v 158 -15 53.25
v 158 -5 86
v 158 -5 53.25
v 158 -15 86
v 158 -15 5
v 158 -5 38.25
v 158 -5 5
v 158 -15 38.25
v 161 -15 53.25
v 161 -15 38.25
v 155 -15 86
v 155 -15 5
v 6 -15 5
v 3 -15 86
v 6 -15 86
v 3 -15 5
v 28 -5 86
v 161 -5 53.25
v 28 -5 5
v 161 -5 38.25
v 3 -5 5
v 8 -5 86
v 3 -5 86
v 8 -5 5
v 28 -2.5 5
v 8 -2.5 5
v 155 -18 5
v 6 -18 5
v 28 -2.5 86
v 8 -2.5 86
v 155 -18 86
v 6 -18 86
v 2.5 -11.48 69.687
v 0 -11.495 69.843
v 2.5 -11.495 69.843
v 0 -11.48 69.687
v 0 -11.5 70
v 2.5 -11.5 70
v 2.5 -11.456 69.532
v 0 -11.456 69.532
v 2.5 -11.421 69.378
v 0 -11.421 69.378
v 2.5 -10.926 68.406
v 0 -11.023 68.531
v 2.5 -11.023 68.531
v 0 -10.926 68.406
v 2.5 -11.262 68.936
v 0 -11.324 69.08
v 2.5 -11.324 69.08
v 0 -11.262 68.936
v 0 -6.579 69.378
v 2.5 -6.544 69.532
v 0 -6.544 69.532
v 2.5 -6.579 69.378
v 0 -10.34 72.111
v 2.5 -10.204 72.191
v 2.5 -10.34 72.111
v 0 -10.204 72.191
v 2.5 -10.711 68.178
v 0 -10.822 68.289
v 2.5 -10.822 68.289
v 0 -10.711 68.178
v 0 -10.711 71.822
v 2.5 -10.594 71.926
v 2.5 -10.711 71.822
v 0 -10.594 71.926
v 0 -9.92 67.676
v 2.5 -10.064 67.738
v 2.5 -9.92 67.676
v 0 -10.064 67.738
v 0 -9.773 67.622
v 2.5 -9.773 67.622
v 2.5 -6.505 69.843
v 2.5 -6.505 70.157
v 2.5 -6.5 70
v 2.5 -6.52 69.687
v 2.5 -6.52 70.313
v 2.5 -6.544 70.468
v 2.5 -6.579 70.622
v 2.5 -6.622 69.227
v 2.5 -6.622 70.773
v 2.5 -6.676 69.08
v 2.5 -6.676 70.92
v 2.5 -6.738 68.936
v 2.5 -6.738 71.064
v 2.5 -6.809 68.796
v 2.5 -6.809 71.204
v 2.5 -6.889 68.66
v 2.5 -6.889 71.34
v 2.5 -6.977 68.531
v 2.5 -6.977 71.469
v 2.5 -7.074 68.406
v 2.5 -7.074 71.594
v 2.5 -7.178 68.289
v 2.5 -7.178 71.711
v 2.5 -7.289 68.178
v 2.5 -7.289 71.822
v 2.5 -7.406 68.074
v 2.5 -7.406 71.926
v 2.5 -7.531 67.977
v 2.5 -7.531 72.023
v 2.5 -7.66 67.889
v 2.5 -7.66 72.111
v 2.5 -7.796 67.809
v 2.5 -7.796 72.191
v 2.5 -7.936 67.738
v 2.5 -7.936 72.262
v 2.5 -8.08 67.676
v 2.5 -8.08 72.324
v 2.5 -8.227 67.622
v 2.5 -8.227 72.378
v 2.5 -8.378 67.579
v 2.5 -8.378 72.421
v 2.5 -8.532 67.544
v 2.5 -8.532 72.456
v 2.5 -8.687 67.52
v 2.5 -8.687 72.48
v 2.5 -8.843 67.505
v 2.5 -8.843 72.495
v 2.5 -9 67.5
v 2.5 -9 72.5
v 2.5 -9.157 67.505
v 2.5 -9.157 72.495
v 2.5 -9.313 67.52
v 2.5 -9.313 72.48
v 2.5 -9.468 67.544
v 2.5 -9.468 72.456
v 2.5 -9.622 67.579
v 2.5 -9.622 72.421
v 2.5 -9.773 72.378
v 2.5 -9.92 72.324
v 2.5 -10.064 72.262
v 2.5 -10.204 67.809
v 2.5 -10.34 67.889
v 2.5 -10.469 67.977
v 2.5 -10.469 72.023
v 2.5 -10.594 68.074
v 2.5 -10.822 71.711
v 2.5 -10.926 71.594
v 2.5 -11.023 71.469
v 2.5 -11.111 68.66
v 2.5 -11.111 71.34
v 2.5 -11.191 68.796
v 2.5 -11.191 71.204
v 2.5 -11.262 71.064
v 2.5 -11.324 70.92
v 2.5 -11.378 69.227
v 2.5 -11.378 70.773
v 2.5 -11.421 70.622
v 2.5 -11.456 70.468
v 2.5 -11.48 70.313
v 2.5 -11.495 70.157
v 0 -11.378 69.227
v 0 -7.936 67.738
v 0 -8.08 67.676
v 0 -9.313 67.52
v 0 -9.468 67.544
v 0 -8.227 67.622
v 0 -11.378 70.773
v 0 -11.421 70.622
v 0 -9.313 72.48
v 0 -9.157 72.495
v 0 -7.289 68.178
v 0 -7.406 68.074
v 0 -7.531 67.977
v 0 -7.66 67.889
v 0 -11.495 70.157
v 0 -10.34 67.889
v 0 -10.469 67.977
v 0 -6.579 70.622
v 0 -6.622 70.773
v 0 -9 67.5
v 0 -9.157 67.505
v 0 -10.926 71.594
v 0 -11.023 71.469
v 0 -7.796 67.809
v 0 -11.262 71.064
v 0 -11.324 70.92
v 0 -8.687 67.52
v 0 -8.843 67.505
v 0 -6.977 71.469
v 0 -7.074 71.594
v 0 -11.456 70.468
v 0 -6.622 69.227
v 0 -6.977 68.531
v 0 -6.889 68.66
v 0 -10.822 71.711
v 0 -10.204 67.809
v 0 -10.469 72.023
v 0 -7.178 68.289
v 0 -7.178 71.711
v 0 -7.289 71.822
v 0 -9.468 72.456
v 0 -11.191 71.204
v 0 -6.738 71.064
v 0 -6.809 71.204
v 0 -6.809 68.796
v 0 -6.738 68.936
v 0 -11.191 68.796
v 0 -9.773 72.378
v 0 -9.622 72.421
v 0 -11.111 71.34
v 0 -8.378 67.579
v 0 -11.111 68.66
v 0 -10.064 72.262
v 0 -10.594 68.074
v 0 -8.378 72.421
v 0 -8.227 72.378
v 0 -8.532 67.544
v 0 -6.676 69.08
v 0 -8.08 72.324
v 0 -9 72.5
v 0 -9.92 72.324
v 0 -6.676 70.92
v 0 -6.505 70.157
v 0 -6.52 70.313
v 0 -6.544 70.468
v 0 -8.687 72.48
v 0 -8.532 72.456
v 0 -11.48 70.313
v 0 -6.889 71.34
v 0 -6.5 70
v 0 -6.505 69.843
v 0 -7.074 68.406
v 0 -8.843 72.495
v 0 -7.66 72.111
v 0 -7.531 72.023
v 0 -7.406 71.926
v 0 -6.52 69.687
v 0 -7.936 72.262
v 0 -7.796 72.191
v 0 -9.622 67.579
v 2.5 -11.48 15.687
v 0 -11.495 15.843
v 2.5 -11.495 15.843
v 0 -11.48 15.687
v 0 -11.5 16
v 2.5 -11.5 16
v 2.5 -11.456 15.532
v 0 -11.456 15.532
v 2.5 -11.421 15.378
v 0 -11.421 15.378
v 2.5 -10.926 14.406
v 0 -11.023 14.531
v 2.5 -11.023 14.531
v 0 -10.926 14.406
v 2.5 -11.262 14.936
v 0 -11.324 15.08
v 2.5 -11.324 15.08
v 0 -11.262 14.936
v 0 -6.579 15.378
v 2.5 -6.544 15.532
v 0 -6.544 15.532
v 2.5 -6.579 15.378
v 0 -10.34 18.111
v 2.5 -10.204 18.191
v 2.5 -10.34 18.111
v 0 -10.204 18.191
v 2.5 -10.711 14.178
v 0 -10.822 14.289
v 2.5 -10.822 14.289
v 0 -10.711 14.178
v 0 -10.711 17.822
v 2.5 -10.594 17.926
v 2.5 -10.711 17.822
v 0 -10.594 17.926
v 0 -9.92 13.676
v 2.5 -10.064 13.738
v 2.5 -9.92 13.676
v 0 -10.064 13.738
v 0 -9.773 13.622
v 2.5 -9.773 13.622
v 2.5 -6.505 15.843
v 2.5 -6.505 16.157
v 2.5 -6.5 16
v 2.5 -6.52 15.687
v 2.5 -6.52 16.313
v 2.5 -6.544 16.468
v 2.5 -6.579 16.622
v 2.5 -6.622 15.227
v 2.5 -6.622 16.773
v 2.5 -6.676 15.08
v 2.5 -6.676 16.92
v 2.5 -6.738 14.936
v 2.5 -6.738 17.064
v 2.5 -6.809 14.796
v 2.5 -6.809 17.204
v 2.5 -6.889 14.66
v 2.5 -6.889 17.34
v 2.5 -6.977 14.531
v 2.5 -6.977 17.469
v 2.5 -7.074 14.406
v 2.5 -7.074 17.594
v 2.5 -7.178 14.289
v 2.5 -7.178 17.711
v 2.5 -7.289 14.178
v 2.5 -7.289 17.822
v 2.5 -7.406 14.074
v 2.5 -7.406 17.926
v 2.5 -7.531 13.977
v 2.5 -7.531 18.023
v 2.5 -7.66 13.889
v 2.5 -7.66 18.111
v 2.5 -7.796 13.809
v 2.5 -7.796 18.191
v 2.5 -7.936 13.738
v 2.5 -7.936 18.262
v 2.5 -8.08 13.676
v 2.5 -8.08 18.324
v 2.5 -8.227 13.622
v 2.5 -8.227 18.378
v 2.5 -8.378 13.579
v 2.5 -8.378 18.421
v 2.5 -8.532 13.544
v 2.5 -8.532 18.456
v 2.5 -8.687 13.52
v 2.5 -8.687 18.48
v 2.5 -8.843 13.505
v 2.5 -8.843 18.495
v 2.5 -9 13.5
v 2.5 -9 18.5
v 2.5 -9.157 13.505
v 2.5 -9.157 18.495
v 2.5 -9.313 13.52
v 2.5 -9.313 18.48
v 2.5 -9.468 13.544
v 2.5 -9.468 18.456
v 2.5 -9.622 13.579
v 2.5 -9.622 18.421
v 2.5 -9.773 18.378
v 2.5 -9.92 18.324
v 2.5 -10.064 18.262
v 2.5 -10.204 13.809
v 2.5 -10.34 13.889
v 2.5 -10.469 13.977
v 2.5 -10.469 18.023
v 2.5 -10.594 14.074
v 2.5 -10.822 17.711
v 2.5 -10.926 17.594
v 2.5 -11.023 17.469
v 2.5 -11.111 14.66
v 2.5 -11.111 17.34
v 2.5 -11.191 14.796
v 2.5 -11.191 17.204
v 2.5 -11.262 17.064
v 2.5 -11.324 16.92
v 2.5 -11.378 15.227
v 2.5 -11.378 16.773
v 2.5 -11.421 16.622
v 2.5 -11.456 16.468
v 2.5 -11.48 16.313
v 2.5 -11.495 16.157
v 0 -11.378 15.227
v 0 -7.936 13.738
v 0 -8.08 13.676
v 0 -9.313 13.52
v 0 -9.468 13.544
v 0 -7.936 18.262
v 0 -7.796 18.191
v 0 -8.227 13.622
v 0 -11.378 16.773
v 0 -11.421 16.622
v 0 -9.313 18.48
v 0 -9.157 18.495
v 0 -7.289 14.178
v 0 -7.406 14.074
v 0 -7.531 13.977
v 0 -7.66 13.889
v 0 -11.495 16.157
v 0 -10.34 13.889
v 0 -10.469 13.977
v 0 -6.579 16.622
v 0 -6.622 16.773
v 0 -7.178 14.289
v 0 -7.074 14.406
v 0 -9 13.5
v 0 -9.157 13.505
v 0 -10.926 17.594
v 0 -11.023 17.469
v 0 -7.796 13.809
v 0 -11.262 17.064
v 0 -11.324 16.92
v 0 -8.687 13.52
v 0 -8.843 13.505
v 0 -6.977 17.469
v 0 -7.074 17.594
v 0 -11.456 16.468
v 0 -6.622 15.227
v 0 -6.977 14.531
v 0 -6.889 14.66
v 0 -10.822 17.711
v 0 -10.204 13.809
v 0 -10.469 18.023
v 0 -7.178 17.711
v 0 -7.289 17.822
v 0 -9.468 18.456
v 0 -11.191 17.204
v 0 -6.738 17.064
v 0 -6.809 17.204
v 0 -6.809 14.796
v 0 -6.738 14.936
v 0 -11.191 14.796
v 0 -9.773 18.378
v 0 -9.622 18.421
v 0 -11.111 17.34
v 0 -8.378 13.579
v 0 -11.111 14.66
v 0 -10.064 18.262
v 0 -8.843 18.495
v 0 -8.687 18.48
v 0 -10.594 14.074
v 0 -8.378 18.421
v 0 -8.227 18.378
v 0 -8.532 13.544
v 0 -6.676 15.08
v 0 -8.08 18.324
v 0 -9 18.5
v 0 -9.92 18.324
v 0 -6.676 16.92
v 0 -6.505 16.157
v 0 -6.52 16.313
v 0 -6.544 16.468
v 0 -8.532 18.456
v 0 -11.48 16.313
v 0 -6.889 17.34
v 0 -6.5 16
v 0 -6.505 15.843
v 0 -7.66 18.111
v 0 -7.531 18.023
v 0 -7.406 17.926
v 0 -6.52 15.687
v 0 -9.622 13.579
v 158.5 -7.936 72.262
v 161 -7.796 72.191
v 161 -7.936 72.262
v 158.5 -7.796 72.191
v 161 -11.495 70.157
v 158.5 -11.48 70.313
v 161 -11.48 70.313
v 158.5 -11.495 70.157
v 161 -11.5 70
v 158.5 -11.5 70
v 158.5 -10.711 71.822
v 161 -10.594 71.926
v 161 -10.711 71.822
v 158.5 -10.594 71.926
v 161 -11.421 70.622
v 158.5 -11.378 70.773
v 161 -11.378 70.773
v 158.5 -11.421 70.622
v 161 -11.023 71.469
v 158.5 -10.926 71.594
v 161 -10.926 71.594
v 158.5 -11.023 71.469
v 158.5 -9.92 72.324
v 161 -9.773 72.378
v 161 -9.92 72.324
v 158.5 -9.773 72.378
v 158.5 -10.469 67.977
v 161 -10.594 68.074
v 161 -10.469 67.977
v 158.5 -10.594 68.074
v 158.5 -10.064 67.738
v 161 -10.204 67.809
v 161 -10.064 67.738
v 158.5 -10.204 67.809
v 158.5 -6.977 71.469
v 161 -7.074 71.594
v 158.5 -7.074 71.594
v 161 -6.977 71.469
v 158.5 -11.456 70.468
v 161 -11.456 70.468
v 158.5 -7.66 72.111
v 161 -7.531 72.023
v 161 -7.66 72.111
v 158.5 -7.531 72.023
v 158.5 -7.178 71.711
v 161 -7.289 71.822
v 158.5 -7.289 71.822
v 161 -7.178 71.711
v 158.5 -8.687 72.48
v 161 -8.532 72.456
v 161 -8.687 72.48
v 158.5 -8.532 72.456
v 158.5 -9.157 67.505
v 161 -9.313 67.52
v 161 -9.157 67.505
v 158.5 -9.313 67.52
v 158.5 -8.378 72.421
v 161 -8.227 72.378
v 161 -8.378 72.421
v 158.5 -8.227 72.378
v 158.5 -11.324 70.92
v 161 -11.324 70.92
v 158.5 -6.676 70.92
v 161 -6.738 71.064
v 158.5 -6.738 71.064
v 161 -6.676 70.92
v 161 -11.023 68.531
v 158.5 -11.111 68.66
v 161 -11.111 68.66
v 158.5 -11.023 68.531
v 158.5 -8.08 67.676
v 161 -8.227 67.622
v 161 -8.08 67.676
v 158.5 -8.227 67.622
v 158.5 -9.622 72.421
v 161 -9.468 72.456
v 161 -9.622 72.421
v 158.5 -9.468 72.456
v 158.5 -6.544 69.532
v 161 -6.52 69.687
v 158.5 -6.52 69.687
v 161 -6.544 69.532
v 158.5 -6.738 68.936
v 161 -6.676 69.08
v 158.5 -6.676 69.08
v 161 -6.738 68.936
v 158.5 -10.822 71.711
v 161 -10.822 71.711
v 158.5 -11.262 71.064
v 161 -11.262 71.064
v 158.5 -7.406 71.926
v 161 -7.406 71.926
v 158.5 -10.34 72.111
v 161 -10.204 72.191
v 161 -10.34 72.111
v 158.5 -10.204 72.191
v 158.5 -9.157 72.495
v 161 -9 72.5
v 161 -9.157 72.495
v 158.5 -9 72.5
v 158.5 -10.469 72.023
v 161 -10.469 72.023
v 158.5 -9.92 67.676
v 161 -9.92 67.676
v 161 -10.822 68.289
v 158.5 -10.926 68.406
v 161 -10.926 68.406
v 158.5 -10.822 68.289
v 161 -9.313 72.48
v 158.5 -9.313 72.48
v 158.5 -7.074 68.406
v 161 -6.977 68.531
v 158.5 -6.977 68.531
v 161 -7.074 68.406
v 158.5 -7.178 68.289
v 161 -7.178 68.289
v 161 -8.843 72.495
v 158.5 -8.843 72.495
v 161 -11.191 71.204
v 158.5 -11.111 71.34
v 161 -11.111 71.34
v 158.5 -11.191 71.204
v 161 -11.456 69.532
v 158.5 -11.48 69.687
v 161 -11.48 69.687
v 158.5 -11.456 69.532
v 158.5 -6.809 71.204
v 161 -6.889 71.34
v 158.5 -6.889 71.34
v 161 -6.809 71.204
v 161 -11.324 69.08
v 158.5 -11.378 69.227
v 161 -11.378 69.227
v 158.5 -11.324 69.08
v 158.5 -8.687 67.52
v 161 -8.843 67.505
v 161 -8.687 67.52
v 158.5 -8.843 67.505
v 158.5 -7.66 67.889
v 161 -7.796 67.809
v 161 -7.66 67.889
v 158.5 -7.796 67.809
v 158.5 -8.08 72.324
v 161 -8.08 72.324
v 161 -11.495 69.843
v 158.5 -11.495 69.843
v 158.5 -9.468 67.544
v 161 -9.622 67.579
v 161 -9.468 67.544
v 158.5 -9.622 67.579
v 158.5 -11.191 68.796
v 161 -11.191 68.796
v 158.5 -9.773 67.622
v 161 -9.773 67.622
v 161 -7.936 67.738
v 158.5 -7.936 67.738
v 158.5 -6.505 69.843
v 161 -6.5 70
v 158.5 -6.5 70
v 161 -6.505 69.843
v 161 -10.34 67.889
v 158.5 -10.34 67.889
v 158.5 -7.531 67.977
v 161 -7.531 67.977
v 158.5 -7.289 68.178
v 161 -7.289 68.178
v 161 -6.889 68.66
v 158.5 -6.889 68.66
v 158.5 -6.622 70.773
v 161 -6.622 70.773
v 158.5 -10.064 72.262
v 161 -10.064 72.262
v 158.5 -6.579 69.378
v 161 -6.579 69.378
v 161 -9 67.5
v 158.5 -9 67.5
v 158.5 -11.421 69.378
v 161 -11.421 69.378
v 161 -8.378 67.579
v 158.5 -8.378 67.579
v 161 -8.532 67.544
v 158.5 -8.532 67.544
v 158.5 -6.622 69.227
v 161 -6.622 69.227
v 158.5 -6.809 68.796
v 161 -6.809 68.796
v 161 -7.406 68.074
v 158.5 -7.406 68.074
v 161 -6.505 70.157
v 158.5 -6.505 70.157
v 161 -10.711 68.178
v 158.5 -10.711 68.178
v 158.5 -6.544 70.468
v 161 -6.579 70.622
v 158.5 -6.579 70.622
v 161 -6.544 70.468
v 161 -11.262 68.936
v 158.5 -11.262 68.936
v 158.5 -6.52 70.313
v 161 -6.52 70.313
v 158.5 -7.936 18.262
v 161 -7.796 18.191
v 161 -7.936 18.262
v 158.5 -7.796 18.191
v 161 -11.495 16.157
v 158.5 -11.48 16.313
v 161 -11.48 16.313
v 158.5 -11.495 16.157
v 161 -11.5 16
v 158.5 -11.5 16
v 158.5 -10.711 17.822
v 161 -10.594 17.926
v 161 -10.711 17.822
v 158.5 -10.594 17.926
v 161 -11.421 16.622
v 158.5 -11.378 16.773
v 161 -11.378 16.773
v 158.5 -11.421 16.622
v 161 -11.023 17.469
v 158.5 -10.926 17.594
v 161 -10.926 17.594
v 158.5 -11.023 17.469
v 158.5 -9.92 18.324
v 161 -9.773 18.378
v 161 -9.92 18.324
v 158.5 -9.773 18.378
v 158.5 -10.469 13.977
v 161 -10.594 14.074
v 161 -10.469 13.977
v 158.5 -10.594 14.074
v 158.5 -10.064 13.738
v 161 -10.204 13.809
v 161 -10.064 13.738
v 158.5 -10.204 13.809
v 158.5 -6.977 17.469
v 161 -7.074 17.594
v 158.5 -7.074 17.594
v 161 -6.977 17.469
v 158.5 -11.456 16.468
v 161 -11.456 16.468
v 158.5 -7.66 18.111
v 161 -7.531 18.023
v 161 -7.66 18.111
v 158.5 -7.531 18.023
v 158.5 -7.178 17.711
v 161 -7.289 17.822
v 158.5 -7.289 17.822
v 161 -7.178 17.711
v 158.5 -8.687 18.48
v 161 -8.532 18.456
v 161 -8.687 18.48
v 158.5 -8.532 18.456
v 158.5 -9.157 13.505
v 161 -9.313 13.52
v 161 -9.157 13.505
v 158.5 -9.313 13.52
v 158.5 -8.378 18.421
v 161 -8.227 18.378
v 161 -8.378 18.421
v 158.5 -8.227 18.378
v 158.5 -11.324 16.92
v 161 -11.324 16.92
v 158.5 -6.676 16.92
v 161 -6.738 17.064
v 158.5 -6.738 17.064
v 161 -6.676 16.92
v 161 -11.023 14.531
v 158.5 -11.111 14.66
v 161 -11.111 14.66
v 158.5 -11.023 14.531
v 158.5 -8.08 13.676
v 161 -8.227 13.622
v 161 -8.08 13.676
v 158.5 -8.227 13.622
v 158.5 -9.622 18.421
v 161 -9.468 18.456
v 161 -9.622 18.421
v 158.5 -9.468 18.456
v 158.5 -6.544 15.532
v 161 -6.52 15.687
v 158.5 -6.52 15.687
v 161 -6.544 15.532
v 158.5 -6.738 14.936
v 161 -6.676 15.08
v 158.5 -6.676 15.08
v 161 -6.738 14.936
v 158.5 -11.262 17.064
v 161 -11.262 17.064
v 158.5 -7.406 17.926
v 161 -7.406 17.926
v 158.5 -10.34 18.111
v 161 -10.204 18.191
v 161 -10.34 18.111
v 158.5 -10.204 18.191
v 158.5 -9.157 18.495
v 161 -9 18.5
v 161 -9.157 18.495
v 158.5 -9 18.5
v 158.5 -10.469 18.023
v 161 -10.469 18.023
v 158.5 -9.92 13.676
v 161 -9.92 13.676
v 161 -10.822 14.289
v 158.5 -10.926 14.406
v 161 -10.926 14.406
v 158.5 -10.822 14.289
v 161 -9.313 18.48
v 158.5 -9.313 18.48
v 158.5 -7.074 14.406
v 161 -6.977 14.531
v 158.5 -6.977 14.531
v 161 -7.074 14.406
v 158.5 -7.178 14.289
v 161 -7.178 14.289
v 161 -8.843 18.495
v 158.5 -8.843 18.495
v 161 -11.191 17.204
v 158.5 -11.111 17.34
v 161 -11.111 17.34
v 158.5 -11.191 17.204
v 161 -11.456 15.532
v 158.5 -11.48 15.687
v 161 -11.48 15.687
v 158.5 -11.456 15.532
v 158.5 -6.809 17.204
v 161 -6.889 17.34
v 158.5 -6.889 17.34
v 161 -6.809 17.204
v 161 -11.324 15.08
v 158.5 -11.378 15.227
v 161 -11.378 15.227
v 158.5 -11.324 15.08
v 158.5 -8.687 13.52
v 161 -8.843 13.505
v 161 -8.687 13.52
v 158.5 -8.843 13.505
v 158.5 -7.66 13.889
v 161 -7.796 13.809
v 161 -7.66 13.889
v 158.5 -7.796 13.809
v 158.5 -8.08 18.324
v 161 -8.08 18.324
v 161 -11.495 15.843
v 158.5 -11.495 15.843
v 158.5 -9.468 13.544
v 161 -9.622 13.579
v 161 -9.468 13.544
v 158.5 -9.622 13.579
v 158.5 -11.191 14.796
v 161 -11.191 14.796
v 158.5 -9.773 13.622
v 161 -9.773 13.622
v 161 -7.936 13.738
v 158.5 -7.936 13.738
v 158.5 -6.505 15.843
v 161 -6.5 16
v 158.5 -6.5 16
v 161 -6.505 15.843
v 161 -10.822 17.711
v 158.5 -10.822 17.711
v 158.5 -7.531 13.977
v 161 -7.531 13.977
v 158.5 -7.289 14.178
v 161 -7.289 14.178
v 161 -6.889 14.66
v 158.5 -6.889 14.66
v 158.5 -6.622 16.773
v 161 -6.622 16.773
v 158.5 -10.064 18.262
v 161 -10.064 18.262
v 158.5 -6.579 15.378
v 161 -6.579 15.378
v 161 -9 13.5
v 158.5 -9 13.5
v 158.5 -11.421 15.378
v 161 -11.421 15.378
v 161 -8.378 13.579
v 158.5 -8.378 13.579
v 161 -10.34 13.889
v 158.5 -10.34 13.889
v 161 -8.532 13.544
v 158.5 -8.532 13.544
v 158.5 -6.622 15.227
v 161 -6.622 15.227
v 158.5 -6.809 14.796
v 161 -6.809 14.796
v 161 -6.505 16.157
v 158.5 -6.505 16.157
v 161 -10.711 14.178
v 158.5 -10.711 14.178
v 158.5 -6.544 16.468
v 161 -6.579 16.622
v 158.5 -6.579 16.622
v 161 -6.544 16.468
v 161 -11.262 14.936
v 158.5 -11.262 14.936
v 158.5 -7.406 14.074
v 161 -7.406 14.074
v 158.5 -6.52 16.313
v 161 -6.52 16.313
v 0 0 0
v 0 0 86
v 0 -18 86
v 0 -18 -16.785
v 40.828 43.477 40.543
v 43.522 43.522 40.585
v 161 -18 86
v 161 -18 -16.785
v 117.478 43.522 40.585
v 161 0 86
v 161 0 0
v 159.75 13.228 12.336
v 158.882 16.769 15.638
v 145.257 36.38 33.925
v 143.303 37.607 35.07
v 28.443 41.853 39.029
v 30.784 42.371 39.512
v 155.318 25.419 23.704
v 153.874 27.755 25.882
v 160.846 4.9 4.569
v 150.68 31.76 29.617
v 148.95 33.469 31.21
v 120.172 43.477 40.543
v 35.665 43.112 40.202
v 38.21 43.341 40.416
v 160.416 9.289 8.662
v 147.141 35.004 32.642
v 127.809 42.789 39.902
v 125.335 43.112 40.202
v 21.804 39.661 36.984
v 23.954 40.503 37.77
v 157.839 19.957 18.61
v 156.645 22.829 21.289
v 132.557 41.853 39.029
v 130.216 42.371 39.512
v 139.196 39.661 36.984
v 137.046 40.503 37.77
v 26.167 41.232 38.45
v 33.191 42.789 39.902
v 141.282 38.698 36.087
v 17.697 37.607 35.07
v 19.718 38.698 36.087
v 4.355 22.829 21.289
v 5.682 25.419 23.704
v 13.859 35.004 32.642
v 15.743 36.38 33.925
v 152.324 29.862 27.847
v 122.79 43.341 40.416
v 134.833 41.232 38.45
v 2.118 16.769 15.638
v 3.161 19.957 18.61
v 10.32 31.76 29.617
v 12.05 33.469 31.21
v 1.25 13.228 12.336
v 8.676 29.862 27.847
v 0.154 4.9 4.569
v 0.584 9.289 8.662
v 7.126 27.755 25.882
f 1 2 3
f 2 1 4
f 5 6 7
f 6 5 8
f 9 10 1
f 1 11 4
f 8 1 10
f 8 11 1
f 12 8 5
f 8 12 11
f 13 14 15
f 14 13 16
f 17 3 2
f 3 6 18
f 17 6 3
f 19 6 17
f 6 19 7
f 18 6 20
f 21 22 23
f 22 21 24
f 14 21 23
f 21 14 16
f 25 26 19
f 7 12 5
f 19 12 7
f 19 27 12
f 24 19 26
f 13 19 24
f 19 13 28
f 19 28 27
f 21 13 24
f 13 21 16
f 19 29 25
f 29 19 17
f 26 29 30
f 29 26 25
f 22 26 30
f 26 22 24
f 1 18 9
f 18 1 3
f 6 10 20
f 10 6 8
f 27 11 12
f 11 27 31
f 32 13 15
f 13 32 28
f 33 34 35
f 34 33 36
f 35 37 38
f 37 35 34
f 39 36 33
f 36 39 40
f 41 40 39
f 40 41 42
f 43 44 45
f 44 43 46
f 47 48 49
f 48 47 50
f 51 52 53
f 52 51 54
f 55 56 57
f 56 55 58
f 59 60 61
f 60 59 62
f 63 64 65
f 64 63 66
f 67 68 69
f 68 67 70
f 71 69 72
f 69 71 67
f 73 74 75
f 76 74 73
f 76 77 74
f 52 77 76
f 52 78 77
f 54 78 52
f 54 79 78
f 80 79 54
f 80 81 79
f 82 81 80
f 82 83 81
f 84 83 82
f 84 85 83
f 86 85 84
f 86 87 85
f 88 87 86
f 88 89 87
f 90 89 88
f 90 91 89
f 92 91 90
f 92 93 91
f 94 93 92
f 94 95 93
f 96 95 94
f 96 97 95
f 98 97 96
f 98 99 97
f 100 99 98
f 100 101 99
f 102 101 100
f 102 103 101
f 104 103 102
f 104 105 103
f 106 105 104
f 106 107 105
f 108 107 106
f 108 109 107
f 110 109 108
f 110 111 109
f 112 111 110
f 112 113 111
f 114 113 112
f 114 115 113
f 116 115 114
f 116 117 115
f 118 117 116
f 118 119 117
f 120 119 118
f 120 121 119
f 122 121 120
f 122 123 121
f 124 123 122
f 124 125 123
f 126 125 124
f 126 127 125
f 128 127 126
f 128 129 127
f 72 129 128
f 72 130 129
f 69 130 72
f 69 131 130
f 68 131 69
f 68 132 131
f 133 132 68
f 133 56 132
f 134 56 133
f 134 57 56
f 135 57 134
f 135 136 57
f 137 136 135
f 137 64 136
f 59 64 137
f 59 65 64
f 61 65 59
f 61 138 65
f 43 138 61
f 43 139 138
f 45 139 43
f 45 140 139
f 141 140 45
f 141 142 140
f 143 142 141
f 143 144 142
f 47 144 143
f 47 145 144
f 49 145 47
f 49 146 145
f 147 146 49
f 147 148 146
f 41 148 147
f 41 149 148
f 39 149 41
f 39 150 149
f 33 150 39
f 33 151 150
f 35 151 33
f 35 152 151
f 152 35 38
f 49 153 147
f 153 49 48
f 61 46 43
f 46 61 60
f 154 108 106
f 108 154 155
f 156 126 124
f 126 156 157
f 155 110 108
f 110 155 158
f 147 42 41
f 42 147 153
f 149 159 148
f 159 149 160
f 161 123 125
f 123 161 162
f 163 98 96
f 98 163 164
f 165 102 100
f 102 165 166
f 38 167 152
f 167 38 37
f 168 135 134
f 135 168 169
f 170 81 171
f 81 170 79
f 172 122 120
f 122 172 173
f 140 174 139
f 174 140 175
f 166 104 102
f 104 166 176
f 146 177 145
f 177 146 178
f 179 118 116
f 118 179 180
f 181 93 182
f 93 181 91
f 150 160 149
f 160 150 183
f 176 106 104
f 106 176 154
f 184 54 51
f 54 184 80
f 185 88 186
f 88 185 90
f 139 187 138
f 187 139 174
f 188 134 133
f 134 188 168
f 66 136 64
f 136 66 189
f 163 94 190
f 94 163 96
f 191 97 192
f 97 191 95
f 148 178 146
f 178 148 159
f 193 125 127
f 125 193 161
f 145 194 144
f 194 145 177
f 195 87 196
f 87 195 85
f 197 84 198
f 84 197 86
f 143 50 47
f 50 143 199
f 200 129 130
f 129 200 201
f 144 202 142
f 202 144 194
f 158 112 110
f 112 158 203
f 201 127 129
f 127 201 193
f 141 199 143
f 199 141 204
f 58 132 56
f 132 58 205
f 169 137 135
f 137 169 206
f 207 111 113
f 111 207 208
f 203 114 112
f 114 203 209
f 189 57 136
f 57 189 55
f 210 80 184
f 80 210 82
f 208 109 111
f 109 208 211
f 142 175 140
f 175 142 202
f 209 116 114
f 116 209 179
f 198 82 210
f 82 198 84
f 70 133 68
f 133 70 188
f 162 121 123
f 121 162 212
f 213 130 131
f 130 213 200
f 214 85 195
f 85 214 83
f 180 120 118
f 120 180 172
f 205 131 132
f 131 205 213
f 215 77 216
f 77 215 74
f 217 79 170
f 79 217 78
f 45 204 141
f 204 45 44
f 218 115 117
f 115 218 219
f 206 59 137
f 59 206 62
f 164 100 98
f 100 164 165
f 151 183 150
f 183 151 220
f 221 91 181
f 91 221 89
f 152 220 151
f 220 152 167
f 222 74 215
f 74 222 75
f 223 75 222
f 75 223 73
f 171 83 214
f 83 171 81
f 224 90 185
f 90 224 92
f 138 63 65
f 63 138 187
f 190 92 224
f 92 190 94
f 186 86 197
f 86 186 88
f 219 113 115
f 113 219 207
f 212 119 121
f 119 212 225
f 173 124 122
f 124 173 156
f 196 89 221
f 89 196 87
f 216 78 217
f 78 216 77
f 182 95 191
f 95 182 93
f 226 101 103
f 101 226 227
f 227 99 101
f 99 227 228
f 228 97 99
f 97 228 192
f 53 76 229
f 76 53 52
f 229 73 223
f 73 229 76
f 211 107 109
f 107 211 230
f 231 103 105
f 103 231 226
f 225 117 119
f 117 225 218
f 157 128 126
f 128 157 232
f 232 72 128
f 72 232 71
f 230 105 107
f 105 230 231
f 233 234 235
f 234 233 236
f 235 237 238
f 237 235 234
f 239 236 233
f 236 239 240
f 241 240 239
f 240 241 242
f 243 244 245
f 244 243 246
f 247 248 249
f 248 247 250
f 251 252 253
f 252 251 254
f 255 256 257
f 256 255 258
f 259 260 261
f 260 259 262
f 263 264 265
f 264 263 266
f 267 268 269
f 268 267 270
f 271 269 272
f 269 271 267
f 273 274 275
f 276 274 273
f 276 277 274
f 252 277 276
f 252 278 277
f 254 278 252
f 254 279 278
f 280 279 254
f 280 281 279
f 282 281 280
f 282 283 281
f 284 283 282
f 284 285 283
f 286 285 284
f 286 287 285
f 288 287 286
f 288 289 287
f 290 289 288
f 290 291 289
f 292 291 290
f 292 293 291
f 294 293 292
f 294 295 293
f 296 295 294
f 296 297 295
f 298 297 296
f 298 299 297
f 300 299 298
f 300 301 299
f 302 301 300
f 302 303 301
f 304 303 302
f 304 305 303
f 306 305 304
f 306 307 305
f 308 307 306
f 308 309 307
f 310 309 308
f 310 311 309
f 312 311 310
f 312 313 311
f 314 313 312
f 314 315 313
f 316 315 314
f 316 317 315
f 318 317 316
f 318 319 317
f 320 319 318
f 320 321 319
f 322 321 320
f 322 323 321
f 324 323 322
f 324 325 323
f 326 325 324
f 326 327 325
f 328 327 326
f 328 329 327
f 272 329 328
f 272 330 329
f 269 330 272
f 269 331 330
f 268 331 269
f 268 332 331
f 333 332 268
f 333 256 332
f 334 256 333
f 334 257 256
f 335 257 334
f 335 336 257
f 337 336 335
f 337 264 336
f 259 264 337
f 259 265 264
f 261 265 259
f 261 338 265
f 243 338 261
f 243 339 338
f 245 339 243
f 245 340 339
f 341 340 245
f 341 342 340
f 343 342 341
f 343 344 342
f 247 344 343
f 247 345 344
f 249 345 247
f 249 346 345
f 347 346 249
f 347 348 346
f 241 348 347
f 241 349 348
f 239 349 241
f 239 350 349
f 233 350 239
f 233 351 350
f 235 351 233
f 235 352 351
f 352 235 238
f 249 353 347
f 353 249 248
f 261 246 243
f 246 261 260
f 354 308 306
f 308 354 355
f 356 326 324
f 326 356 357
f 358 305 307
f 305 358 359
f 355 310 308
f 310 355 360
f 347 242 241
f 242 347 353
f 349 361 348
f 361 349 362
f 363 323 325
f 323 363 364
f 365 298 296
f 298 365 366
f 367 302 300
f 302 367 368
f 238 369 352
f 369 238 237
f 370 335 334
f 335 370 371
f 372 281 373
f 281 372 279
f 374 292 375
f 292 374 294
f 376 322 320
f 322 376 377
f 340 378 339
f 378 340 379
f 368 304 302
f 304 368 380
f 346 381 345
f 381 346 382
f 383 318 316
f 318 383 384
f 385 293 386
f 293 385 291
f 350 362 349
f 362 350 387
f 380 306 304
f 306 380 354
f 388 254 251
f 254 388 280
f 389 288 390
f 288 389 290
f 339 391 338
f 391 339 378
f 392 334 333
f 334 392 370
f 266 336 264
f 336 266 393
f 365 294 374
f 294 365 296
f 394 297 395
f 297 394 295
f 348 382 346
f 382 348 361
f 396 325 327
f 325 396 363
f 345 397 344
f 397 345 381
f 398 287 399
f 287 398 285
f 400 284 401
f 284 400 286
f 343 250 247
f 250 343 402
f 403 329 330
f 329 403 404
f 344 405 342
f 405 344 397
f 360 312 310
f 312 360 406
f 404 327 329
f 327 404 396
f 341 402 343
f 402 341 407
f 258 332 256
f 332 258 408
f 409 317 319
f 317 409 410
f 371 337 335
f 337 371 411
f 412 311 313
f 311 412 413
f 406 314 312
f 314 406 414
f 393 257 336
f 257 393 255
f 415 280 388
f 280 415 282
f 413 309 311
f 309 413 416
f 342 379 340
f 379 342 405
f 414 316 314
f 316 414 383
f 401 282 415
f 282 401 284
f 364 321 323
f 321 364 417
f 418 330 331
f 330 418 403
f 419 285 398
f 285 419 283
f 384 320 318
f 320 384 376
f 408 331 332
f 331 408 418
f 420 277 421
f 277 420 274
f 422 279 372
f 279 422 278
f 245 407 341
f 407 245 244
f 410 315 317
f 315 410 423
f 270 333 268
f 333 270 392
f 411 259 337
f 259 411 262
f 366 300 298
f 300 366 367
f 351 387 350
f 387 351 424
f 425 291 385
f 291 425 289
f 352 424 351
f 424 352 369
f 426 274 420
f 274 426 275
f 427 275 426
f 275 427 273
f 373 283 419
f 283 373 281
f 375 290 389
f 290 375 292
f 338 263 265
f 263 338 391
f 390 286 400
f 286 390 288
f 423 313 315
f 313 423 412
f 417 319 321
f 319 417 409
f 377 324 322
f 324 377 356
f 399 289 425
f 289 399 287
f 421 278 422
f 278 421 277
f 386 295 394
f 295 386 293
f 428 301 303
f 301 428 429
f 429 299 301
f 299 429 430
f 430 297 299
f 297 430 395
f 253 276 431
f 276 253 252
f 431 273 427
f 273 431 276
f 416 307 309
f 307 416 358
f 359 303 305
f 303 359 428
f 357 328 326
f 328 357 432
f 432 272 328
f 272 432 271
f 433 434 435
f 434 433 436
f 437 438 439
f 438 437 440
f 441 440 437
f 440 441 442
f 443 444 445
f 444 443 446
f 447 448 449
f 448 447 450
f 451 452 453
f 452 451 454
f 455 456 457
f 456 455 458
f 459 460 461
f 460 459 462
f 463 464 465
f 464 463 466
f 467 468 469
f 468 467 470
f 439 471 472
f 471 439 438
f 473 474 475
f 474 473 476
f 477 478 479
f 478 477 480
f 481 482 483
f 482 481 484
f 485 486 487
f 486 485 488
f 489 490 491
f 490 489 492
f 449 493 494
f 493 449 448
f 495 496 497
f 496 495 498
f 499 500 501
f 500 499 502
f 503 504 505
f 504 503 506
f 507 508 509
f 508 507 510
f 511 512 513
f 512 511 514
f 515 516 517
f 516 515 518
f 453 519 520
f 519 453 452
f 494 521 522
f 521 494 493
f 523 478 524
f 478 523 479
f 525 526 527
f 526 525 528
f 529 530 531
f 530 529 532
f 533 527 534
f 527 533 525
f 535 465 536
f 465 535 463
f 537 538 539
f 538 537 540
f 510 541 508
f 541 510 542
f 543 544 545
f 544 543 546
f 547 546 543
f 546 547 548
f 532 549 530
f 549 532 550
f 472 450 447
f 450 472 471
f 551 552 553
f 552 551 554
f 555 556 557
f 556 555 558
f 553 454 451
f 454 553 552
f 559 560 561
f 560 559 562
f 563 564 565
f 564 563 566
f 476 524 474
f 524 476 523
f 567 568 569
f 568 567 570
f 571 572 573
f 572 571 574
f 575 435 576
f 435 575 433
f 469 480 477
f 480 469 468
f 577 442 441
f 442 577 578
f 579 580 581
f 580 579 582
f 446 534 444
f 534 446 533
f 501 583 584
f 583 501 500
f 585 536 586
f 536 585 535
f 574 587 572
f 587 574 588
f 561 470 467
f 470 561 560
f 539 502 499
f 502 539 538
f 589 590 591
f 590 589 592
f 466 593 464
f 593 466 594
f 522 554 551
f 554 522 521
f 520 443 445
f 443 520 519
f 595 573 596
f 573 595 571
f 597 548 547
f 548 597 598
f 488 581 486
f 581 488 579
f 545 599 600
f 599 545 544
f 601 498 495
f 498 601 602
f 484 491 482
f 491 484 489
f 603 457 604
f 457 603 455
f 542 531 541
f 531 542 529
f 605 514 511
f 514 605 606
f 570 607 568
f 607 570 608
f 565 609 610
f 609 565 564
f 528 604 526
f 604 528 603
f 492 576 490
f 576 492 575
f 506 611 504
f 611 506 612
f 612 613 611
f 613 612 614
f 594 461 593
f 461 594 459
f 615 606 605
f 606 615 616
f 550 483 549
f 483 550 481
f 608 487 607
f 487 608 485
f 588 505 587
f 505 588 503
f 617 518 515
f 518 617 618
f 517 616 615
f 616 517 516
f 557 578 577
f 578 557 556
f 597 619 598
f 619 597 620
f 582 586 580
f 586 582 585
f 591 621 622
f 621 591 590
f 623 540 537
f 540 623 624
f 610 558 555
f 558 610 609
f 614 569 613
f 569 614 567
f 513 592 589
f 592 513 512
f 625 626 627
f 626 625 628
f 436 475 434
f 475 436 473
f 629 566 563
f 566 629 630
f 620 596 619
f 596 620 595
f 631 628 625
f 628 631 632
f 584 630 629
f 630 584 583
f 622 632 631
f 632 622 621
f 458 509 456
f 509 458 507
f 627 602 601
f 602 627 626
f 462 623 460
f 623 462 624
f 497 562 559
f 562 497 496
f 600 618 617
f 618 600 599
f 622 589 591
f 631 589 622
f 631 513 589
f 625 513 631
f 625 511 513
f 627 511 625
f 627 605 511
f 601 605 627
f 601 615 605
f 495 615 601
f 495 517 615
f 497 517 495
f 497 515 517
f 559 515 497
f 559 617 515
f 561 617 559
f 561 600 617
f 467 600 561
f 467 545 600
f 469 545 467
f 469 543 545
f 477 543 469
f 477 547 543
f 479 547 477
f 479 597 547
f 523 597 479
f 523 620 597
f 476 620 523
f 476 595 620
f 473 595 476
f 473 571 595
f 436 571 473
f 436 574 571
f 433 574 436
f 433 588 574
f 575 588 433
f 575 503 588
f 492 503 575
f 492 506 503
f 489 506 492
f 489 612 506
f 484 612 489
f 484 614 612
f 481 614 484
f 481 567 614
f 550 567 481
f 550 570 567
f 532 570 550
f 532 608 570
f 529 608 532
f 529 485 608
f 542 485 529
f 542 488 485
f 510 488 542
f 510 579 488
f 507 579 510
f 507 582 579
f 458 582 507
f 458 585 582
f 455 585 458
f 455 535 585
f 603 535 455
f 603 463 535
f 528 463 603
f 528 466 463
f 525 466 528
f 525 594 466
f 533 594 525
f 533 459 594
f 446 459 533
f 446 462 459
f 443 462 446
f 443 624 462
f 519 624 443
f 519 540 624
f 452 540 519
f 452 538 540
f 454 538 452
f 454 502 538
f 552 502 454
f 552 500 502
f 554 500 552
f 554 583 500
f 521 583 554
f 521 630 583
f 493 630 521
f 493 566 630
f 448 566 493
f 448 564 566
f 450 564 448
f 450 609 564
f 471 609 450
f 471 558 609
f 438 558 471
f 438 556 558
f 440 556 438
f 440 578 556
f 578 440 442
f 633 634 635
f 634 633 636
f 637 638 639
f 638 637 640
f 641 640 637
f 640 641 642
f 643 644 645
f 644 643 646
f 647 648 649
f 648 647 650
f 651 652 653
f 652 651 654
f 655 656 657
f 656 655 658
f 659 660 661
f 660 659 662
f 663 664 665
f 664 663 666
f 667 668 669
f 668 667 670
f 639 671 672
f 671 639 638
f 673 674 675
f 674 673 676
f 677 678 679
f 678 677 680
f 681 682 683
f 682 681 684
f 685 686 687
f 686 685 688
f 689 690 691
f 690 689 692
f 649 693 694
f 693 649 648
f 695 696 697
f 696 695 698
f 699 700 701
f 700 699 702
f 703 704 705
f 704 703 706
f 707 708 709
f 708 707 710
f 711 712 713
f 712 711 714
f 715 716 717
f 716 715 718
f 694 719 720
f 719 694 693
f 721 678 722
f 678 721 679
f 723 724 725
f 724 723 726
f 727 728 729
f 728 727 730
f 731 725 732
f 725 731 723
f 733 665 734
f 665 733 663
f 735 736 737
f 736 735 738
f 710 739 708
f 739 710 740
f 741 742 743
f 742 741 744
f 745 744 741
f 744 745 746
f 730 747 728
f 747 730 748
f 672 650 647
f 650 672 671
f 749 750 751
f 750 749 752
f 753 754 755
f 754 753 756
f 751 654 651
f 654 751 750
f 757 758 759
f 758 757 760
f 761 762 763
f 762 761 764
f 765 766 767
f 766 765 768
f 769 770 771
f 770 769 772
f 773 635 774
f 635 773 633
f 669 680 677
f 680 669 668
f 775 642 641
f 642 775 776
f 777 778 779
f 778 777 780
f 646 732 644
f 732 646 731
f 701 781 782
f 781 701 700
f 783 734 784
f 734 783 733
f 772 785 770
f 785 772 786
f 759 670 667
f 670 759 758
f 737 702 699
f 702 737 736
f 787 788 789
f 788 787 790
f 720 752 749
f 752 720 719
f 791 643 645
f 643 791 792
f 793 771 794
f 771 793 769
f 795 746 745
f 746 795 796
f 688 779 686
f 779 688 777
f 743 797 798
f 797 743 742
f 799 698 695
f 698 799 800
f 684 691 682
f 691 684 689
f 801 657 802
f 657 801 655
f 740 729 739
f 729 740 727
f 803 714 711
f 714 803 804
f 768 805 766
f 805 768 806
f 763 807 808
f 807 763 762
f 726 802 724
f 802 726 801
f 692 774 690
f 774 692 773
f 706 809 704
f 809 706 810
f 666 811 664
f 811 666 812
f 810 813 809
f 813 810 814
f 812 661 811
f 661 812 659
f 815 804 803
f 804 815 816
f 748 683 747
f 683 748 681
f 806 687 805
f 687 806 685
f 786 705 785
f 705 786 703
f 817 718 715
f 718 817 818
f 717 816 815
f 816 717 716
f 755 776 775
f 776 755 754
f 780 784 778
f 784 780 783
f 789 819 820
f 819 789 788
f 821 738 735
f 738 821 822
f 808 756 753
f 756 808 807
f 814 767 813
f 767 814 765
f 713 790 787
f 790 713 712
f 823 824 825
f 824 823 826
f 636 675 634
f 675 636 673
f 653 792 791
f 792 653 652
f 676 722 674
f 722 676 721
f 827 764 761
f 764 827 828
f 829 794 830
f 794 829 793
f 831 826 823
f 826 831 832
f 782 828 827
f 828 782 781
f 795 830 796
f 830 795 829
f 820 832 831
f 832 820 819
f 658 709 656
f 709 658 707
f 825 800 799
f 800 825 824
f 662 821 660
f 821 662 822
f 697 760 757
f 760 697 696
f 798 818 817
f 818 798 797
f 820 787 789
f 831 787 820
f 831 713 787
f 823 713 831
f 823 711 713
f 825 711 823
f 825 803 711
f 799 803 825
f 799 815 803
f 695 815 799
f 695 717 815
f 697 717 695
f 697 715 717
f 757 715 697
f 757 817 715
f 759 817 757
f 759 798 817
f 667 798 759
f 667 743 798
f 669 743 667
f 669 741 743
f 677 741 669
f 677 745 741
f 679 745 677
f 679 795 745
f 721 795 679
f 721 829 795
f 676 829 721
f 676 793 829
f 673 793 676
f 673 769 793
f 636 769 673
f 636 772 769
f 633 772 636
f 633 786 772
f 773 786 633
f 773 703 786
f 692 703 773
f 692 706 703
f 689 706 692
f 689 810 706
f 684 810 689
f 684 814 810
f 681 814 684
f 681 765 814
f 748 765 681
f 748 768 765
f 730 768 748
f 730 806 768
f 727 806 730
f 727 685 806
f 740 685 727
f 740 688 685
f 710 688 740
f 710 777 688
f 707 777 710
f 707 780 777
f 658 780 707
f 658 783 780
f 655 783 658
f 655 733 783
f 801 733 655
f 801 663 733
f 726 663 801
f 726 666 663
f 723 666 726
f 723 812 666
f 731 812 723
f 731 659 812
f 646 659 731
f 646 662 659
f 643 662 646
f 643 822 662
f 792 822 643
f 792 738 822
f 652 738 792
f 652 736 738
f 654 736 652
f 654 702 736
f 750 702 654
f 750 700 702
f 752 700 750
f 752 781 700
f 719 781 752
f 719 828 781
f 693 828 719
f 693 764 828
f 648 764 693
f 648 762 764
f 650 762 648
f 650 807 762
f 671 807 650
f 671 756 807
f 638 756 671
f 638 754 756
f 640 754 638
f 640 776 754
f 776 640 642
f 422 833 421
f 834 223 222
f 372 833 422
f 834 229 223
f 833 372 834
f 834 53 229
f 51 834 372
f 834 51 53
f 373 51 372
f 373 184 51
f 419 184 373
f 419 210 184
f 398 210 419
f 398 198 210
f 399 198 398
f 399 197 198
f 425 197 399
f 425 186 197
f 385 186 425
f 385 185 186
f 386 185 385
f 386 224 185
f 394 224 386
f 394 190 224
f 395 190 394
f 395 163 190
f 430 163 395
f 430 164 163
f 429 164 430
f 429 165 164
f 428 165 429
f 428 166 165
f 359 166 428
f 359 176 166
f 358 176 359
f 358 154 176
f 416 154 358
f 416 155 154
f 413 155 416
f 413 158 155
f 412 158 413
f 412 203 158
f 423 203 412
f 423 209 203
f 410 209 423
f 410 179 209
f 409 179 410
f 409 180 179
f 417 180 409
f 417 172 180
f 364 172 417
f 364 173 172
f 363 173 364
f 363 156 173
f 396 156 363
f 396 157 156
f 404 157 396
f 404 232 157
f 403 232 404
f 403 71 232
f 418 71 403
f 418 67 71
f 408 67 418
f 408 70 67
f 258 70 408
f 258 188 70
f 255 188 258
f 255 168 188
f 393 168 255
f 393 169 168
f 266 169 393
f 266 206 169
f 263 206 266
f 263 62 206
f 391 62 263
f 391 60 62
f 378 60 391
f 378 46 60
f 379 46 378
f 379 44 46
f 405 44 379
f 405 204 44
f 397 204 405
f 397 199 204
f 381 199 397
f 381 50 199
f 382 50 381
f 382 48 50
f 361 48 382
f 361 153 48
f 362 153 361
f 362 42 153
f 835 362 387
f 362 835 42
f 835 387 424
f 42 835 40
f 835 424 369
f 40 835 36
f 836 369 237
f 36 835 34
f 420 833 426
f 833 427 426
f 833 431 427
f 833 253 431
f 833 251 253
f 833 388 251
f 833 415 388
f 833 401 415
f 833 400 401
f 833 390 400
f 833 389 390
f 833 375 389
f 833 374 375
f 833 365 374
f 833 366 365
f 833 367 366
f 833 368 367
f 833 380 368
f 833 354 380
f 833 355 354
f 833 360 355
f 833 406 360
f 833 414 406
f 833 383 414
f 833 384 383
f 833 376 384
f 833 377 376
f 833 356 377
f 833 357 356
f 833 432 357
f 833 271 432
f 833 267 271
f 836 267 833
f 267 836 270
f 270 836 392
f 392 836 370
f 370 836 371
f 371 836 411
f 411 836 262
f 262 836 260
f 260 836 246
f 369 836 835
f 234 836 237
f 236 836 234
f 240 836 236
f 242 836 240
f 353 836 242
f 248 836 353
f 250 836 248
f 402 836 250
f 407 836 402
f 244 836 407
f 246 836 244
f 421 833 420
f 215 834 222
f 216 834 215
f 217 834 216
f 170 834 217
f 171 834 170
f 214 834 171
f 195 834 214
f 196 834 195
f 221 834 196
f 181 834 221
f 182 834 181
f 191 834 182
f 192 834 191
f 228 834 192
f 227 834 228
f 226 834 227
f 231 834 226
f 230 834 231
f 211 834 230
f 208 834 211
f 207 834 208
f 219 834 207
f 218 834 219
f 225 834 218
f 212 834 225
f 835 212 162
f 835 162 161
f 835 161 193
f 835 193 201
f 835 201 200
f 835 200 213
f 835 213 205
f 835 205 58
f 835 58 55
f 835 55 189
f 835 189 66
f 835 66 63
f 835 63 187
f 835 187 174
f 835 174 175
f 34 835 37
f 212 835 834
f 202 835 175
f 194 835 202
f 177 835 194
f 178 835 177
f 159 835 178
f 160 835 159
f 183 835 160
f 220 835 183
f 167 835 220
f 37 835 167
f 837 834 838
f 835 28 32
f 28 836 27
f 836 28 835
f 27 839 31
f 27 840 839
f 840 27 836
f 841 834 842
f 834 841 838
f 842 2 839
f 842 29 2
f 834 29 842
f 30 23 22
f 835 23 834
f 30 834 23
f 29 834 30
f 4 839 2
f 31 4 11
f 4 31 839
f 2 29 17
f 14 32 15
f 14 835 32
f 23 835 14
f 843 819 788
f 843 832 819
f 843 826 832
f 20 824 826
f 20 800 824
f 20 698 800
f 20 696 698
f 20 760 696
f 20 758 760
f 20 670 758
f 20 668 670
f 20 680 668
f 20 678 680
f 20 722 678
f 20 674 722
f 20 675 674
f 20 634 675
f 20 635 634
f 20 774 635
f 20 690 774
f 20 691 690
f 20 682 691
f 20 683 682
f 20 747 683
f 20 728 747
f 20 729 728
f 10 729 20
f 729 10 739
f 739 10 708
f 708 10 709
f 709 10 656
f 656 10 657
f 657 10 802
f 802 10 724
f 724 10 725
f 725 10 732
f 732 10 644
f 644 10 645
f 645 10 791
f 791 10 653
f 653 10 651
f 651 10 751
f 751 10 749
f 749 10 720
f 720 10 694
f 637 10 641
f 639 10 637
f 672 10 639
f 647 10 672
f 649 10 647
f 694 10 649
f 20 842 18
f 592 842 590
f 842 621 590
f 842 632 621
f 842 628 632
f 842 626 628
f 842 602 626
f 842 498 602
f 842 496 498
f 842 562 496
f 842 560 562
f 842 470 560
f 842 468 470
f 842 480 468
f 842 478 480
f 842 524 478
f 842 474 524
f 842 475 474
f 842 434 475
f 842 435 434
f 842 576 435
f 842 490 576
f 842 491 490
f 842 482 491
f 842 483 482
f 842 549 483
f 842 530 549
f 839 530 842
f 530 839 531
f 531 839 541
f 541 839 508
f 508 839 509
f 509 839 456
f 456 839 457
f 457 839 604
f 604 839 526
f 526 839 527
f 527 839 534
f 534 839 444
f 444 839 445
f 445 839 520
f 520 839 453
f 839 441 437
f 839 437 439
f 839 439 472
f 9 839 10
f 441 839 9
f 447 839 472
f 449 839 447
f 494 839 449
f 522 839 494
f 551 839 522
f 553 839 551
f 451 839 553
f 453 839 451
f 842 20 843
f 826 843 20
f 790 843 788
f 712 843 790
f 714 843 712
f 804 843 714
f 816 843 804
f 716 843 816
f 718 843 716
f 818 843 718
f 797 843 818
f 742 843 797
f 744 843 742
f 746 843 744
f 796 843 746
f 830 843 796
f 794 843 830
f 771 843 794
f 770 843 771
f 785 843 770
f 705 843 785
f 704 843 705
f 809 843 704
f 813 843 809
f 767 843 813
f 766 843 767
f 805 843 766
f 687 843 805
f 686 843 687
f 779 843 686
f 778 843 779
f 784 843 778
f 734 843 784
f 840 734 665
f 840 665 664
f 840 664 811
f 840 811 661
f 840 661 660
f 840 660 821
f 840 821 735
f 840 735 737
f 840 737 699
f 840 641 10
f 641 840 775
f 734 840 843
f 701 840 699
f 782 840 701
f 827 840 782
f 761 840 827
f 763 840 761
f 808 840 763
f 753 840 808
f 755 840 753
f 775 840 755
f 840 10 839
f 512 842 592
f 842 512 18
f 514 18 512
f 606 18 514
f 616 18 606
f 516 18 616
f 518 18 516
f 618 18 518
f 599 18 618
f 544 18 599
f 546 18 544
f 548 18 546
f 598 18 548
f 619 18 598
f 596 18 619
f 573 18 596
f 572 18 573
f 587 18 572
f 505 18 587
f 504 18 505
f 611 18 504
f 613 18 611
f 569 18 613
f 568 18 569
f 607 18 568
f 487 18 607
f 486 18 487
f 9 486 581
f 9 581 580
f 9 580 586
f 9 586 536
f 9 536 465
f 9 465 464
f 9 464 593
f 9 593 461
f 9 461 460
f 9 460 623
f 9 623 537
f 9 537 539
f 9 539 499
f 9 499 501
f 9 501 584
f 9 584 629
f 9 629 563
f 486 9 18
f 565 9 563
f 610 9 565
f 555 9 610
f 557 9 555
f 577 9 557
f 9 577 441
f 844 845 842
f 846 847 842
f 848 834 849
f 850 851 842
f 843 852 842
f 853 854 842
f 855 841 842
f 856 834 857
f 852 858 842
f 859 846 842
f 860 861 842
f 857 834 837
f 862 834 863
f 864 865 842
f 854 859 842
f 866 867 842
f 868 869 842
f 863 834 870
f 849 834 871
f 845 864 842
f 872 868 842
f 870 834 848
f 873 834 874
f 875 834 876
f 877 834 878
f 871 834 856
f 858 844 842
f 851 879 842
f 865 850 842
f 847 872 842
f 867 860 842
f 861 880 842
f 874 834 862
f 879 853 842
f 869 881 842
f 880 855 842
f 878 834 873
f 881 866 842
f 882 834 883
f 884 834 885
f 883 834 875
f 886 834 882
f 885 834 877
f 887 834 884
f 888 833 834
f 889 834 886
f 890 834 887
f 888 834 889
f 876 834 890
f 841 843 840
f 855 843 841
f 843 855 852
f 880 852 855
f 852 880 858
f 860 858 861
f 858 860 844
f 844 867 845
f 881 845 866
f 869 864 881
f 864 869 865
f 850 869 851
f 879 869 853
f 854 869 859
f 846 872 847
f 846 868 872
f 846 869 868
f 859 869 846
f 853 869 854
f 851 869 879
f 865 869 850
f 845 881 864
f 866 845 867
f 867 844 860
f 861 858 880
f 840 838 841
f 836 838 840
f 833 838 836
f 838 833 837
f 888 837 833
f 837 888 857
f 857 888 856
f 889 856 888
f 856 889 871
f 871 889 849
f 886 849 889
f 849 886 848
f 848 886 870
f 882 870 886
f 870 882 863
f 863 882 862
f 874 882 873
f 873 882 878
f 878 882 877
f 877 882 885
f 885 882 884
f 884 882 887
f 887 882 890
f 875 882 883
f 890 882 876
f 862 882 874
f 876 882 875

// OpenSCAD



$fn = 100;

// usage:   adjust the phone module to suite your device.  This module represents the "cutouts" into
//          the mount and the visor.  Export the mount to STL, comment the mount and uncomment the 
//          visor, and export the visor to STL.  


// this is the entire phone mount (no visor)
difference(){
    hull(){
        // main phone block
        rotate([90,0,0]) cube([161,86,18]);

        // phone block extension (chin) - will be cut with difference
        translate([0,0,-20])rotate([90,0,0]) cube([161,20,18]);

        // mounting area
        translate([80.5,0,0]) halfcylinder(80.5, 2, 0.2);        
    }
    
    // cuts off the back section for a flush mount
    rotate([-47,0,0]) translate([-1,0,-100])cube([200,200,200]);

    translate([3,-5,5]) // 3 is the (161-155) / 
        rotate([90,0,0])
            phone([155, 81.5, 10]);

    // visor mounting holes
    rotate([0,0,-90]) visorMountingHoles(0);

}


// this is the visor
%union(){
    difference() {    
        rotate([0,0,-90]) mountVisor();

        translate([3,-5,5]) // 3 is the (161-155) 
            rotate([90,0,0])
                phone([155, 81, 10]); // slightly smaller phone to avoid cutting into the visor
    }
    
    // visor mounting holes
    rotate([0,0,-90]) visorMountingHoles(1);
}





// ==========================================================================
// ============================ PHONE MODULE ================================
// ==========================================================================
module phone (size)
{
    //cornerrad = 5;
    x = size[0];// - cornerrad;
	y = size[1];// - cornerrad;
	z = size[2];

    //main phone cube
    cube([x,y,z]);
    

    //////// camera hump ////////
    // x center position from the top of the phone
    // how large is the bump
    // height how tall is the bump
    camerabump = [5, 20, 2.5];
    translate([camerabump[0],0,-camerabump[2]])
        cube([camerabump[1],y,camerabump[2]]);
    


    /////// button cutout ///////
    // the x and y location of the button cutout    
    buttoncutout = [20, y]; // x is mm from top of phone, y for right side of phone
    translate([buttoncutout[0], buttoncutout[1]]) 
        cube([50,15,z]);
    
    
    /////// usb cutout ///////
    // the x and y location of the usbcutout
    usbcutout = [x, y/2];
    translate([usbcutout[0], usbcutout[1] - 7.5]) // -7.5 is half the cutout size
        cube([25,15,z]);

    /////// screen visibility block //////////
    screencutout = [x-6,y,20];
    translate([(x-screencutout[0])/2, (y-screencutout[1])/2,z])
        cube([screencutout[0], screencutout[1], screencutout[2]]);
        
        
        
}






// ==========================================================================
// ============================= VISOR MODULES ==============================
// ==========================================================================

// isvisor = 1, then these will be the pegs for the visor.  else it's the holes for the pegs.
module visorMountingHoles(isVisor)
{
    
    if(isVisor == 1)
    {
        // left side mounts
        translate([9,0,70]) rotate([-90,0,0]) cylinder(2,2, 2);
        translate([9,0,16]) rotate([-90,0,0]) cylinder(2,2, 2);

        // right side mounts
        translate([9,161.5,70]) rotate([90,0,0]) cylinder(2,2, 2);
        translate([9,161.5,16]) rotate([90,0,0]) cylinder(2,2, 2);

    } else {
        
        // leftside has offset on y to compensate for rendering issues if creating holes for the pegs
        // left side mounts
        translate([9,-0.5,70]) rotate([-90,0,0]) cylinder(3,2.5, 2.5);
        translate([9,-0.5,16]) rotate([-90,0,0]) cylinder(3,2.5, 2.5);

        // right side mounts
        translate([9,161.5,70]) rotate([90,0,0]) cylinder(3,2.5, 2.5);
        translate([9,161.5,16]) rotate([90,0,0]) cylinder(3,2.5, 2.5);
        
    }
    
    
}

module mountVisor()
{

    coverpoints = [
        [  0,  0,  0], //0
        [  0, 86,  0], //1
        [ 70, 86,  0], //2
        [ 70, 56,  0], //3
        [ 18,  0,  0], //4

        [  0,  0,  2], //5
        [  0, 86,  2], //6
        [ 70, 86,  2], //7
        [ 70, 56,  2], //8
        [ 18,  0,  2], //9

    ];

    coverfaces = [
      [4,3,2,1,0],  
      [0,1,6,5],
      [1,2,7,6],
      [2,3,8,7],
      [3,4,9,8],
      [0,5,9,4],
      [5,6,7,8,9]
      ]; 




    //left side
        rotate([90,0,0])
            polyhedron(coverpoints, coverfaces);

    //right side 2 + 161 + 0.5 = visor width of left side + length of mount + 0.5mm tolerance
    translate([0,163.5,0]) 
        rotate([90,0,0])
            polyhedron(coverpoints, coverfaces);

    translate([0,-2,86])
        cube([70,165.5,2]); // 2*visor length + mount + tolerance

}








// ==========================================================================
// ============================== MISC MODULES ==============================
// ==========================================================================


module halfcylinder(r, h, e)
{
    difference(){
            cylinder(h,r,r);
            translate([-r,-2*r,-e]) cube([2*r,2*r,h+2*e]);
        }
}


module roundedRect(size, radius)
{
	x = size[0];
	y = size[1];
	z = size[2];

	linear_extrude(height=z)
	hull()
	{
		// place 4 circles in the corners, with the given radius
		translate([(-x/2)+(radius/2), (-y/2)+(radius/2), 0])
		circle(r=radius);
	
		translate([(x/2)-(radius/2), (-y/2)+(radius/2), 0])
		circle(r=radius);
	
		translate([(-x/2)+(radius/2), (y/2)-(radius/2), 0])
		circle(r=radius);
	
		translate([(x/2)-(radius/2), (y/2)-(radius/2), 0])
		circle(r=radius);
	}
}
